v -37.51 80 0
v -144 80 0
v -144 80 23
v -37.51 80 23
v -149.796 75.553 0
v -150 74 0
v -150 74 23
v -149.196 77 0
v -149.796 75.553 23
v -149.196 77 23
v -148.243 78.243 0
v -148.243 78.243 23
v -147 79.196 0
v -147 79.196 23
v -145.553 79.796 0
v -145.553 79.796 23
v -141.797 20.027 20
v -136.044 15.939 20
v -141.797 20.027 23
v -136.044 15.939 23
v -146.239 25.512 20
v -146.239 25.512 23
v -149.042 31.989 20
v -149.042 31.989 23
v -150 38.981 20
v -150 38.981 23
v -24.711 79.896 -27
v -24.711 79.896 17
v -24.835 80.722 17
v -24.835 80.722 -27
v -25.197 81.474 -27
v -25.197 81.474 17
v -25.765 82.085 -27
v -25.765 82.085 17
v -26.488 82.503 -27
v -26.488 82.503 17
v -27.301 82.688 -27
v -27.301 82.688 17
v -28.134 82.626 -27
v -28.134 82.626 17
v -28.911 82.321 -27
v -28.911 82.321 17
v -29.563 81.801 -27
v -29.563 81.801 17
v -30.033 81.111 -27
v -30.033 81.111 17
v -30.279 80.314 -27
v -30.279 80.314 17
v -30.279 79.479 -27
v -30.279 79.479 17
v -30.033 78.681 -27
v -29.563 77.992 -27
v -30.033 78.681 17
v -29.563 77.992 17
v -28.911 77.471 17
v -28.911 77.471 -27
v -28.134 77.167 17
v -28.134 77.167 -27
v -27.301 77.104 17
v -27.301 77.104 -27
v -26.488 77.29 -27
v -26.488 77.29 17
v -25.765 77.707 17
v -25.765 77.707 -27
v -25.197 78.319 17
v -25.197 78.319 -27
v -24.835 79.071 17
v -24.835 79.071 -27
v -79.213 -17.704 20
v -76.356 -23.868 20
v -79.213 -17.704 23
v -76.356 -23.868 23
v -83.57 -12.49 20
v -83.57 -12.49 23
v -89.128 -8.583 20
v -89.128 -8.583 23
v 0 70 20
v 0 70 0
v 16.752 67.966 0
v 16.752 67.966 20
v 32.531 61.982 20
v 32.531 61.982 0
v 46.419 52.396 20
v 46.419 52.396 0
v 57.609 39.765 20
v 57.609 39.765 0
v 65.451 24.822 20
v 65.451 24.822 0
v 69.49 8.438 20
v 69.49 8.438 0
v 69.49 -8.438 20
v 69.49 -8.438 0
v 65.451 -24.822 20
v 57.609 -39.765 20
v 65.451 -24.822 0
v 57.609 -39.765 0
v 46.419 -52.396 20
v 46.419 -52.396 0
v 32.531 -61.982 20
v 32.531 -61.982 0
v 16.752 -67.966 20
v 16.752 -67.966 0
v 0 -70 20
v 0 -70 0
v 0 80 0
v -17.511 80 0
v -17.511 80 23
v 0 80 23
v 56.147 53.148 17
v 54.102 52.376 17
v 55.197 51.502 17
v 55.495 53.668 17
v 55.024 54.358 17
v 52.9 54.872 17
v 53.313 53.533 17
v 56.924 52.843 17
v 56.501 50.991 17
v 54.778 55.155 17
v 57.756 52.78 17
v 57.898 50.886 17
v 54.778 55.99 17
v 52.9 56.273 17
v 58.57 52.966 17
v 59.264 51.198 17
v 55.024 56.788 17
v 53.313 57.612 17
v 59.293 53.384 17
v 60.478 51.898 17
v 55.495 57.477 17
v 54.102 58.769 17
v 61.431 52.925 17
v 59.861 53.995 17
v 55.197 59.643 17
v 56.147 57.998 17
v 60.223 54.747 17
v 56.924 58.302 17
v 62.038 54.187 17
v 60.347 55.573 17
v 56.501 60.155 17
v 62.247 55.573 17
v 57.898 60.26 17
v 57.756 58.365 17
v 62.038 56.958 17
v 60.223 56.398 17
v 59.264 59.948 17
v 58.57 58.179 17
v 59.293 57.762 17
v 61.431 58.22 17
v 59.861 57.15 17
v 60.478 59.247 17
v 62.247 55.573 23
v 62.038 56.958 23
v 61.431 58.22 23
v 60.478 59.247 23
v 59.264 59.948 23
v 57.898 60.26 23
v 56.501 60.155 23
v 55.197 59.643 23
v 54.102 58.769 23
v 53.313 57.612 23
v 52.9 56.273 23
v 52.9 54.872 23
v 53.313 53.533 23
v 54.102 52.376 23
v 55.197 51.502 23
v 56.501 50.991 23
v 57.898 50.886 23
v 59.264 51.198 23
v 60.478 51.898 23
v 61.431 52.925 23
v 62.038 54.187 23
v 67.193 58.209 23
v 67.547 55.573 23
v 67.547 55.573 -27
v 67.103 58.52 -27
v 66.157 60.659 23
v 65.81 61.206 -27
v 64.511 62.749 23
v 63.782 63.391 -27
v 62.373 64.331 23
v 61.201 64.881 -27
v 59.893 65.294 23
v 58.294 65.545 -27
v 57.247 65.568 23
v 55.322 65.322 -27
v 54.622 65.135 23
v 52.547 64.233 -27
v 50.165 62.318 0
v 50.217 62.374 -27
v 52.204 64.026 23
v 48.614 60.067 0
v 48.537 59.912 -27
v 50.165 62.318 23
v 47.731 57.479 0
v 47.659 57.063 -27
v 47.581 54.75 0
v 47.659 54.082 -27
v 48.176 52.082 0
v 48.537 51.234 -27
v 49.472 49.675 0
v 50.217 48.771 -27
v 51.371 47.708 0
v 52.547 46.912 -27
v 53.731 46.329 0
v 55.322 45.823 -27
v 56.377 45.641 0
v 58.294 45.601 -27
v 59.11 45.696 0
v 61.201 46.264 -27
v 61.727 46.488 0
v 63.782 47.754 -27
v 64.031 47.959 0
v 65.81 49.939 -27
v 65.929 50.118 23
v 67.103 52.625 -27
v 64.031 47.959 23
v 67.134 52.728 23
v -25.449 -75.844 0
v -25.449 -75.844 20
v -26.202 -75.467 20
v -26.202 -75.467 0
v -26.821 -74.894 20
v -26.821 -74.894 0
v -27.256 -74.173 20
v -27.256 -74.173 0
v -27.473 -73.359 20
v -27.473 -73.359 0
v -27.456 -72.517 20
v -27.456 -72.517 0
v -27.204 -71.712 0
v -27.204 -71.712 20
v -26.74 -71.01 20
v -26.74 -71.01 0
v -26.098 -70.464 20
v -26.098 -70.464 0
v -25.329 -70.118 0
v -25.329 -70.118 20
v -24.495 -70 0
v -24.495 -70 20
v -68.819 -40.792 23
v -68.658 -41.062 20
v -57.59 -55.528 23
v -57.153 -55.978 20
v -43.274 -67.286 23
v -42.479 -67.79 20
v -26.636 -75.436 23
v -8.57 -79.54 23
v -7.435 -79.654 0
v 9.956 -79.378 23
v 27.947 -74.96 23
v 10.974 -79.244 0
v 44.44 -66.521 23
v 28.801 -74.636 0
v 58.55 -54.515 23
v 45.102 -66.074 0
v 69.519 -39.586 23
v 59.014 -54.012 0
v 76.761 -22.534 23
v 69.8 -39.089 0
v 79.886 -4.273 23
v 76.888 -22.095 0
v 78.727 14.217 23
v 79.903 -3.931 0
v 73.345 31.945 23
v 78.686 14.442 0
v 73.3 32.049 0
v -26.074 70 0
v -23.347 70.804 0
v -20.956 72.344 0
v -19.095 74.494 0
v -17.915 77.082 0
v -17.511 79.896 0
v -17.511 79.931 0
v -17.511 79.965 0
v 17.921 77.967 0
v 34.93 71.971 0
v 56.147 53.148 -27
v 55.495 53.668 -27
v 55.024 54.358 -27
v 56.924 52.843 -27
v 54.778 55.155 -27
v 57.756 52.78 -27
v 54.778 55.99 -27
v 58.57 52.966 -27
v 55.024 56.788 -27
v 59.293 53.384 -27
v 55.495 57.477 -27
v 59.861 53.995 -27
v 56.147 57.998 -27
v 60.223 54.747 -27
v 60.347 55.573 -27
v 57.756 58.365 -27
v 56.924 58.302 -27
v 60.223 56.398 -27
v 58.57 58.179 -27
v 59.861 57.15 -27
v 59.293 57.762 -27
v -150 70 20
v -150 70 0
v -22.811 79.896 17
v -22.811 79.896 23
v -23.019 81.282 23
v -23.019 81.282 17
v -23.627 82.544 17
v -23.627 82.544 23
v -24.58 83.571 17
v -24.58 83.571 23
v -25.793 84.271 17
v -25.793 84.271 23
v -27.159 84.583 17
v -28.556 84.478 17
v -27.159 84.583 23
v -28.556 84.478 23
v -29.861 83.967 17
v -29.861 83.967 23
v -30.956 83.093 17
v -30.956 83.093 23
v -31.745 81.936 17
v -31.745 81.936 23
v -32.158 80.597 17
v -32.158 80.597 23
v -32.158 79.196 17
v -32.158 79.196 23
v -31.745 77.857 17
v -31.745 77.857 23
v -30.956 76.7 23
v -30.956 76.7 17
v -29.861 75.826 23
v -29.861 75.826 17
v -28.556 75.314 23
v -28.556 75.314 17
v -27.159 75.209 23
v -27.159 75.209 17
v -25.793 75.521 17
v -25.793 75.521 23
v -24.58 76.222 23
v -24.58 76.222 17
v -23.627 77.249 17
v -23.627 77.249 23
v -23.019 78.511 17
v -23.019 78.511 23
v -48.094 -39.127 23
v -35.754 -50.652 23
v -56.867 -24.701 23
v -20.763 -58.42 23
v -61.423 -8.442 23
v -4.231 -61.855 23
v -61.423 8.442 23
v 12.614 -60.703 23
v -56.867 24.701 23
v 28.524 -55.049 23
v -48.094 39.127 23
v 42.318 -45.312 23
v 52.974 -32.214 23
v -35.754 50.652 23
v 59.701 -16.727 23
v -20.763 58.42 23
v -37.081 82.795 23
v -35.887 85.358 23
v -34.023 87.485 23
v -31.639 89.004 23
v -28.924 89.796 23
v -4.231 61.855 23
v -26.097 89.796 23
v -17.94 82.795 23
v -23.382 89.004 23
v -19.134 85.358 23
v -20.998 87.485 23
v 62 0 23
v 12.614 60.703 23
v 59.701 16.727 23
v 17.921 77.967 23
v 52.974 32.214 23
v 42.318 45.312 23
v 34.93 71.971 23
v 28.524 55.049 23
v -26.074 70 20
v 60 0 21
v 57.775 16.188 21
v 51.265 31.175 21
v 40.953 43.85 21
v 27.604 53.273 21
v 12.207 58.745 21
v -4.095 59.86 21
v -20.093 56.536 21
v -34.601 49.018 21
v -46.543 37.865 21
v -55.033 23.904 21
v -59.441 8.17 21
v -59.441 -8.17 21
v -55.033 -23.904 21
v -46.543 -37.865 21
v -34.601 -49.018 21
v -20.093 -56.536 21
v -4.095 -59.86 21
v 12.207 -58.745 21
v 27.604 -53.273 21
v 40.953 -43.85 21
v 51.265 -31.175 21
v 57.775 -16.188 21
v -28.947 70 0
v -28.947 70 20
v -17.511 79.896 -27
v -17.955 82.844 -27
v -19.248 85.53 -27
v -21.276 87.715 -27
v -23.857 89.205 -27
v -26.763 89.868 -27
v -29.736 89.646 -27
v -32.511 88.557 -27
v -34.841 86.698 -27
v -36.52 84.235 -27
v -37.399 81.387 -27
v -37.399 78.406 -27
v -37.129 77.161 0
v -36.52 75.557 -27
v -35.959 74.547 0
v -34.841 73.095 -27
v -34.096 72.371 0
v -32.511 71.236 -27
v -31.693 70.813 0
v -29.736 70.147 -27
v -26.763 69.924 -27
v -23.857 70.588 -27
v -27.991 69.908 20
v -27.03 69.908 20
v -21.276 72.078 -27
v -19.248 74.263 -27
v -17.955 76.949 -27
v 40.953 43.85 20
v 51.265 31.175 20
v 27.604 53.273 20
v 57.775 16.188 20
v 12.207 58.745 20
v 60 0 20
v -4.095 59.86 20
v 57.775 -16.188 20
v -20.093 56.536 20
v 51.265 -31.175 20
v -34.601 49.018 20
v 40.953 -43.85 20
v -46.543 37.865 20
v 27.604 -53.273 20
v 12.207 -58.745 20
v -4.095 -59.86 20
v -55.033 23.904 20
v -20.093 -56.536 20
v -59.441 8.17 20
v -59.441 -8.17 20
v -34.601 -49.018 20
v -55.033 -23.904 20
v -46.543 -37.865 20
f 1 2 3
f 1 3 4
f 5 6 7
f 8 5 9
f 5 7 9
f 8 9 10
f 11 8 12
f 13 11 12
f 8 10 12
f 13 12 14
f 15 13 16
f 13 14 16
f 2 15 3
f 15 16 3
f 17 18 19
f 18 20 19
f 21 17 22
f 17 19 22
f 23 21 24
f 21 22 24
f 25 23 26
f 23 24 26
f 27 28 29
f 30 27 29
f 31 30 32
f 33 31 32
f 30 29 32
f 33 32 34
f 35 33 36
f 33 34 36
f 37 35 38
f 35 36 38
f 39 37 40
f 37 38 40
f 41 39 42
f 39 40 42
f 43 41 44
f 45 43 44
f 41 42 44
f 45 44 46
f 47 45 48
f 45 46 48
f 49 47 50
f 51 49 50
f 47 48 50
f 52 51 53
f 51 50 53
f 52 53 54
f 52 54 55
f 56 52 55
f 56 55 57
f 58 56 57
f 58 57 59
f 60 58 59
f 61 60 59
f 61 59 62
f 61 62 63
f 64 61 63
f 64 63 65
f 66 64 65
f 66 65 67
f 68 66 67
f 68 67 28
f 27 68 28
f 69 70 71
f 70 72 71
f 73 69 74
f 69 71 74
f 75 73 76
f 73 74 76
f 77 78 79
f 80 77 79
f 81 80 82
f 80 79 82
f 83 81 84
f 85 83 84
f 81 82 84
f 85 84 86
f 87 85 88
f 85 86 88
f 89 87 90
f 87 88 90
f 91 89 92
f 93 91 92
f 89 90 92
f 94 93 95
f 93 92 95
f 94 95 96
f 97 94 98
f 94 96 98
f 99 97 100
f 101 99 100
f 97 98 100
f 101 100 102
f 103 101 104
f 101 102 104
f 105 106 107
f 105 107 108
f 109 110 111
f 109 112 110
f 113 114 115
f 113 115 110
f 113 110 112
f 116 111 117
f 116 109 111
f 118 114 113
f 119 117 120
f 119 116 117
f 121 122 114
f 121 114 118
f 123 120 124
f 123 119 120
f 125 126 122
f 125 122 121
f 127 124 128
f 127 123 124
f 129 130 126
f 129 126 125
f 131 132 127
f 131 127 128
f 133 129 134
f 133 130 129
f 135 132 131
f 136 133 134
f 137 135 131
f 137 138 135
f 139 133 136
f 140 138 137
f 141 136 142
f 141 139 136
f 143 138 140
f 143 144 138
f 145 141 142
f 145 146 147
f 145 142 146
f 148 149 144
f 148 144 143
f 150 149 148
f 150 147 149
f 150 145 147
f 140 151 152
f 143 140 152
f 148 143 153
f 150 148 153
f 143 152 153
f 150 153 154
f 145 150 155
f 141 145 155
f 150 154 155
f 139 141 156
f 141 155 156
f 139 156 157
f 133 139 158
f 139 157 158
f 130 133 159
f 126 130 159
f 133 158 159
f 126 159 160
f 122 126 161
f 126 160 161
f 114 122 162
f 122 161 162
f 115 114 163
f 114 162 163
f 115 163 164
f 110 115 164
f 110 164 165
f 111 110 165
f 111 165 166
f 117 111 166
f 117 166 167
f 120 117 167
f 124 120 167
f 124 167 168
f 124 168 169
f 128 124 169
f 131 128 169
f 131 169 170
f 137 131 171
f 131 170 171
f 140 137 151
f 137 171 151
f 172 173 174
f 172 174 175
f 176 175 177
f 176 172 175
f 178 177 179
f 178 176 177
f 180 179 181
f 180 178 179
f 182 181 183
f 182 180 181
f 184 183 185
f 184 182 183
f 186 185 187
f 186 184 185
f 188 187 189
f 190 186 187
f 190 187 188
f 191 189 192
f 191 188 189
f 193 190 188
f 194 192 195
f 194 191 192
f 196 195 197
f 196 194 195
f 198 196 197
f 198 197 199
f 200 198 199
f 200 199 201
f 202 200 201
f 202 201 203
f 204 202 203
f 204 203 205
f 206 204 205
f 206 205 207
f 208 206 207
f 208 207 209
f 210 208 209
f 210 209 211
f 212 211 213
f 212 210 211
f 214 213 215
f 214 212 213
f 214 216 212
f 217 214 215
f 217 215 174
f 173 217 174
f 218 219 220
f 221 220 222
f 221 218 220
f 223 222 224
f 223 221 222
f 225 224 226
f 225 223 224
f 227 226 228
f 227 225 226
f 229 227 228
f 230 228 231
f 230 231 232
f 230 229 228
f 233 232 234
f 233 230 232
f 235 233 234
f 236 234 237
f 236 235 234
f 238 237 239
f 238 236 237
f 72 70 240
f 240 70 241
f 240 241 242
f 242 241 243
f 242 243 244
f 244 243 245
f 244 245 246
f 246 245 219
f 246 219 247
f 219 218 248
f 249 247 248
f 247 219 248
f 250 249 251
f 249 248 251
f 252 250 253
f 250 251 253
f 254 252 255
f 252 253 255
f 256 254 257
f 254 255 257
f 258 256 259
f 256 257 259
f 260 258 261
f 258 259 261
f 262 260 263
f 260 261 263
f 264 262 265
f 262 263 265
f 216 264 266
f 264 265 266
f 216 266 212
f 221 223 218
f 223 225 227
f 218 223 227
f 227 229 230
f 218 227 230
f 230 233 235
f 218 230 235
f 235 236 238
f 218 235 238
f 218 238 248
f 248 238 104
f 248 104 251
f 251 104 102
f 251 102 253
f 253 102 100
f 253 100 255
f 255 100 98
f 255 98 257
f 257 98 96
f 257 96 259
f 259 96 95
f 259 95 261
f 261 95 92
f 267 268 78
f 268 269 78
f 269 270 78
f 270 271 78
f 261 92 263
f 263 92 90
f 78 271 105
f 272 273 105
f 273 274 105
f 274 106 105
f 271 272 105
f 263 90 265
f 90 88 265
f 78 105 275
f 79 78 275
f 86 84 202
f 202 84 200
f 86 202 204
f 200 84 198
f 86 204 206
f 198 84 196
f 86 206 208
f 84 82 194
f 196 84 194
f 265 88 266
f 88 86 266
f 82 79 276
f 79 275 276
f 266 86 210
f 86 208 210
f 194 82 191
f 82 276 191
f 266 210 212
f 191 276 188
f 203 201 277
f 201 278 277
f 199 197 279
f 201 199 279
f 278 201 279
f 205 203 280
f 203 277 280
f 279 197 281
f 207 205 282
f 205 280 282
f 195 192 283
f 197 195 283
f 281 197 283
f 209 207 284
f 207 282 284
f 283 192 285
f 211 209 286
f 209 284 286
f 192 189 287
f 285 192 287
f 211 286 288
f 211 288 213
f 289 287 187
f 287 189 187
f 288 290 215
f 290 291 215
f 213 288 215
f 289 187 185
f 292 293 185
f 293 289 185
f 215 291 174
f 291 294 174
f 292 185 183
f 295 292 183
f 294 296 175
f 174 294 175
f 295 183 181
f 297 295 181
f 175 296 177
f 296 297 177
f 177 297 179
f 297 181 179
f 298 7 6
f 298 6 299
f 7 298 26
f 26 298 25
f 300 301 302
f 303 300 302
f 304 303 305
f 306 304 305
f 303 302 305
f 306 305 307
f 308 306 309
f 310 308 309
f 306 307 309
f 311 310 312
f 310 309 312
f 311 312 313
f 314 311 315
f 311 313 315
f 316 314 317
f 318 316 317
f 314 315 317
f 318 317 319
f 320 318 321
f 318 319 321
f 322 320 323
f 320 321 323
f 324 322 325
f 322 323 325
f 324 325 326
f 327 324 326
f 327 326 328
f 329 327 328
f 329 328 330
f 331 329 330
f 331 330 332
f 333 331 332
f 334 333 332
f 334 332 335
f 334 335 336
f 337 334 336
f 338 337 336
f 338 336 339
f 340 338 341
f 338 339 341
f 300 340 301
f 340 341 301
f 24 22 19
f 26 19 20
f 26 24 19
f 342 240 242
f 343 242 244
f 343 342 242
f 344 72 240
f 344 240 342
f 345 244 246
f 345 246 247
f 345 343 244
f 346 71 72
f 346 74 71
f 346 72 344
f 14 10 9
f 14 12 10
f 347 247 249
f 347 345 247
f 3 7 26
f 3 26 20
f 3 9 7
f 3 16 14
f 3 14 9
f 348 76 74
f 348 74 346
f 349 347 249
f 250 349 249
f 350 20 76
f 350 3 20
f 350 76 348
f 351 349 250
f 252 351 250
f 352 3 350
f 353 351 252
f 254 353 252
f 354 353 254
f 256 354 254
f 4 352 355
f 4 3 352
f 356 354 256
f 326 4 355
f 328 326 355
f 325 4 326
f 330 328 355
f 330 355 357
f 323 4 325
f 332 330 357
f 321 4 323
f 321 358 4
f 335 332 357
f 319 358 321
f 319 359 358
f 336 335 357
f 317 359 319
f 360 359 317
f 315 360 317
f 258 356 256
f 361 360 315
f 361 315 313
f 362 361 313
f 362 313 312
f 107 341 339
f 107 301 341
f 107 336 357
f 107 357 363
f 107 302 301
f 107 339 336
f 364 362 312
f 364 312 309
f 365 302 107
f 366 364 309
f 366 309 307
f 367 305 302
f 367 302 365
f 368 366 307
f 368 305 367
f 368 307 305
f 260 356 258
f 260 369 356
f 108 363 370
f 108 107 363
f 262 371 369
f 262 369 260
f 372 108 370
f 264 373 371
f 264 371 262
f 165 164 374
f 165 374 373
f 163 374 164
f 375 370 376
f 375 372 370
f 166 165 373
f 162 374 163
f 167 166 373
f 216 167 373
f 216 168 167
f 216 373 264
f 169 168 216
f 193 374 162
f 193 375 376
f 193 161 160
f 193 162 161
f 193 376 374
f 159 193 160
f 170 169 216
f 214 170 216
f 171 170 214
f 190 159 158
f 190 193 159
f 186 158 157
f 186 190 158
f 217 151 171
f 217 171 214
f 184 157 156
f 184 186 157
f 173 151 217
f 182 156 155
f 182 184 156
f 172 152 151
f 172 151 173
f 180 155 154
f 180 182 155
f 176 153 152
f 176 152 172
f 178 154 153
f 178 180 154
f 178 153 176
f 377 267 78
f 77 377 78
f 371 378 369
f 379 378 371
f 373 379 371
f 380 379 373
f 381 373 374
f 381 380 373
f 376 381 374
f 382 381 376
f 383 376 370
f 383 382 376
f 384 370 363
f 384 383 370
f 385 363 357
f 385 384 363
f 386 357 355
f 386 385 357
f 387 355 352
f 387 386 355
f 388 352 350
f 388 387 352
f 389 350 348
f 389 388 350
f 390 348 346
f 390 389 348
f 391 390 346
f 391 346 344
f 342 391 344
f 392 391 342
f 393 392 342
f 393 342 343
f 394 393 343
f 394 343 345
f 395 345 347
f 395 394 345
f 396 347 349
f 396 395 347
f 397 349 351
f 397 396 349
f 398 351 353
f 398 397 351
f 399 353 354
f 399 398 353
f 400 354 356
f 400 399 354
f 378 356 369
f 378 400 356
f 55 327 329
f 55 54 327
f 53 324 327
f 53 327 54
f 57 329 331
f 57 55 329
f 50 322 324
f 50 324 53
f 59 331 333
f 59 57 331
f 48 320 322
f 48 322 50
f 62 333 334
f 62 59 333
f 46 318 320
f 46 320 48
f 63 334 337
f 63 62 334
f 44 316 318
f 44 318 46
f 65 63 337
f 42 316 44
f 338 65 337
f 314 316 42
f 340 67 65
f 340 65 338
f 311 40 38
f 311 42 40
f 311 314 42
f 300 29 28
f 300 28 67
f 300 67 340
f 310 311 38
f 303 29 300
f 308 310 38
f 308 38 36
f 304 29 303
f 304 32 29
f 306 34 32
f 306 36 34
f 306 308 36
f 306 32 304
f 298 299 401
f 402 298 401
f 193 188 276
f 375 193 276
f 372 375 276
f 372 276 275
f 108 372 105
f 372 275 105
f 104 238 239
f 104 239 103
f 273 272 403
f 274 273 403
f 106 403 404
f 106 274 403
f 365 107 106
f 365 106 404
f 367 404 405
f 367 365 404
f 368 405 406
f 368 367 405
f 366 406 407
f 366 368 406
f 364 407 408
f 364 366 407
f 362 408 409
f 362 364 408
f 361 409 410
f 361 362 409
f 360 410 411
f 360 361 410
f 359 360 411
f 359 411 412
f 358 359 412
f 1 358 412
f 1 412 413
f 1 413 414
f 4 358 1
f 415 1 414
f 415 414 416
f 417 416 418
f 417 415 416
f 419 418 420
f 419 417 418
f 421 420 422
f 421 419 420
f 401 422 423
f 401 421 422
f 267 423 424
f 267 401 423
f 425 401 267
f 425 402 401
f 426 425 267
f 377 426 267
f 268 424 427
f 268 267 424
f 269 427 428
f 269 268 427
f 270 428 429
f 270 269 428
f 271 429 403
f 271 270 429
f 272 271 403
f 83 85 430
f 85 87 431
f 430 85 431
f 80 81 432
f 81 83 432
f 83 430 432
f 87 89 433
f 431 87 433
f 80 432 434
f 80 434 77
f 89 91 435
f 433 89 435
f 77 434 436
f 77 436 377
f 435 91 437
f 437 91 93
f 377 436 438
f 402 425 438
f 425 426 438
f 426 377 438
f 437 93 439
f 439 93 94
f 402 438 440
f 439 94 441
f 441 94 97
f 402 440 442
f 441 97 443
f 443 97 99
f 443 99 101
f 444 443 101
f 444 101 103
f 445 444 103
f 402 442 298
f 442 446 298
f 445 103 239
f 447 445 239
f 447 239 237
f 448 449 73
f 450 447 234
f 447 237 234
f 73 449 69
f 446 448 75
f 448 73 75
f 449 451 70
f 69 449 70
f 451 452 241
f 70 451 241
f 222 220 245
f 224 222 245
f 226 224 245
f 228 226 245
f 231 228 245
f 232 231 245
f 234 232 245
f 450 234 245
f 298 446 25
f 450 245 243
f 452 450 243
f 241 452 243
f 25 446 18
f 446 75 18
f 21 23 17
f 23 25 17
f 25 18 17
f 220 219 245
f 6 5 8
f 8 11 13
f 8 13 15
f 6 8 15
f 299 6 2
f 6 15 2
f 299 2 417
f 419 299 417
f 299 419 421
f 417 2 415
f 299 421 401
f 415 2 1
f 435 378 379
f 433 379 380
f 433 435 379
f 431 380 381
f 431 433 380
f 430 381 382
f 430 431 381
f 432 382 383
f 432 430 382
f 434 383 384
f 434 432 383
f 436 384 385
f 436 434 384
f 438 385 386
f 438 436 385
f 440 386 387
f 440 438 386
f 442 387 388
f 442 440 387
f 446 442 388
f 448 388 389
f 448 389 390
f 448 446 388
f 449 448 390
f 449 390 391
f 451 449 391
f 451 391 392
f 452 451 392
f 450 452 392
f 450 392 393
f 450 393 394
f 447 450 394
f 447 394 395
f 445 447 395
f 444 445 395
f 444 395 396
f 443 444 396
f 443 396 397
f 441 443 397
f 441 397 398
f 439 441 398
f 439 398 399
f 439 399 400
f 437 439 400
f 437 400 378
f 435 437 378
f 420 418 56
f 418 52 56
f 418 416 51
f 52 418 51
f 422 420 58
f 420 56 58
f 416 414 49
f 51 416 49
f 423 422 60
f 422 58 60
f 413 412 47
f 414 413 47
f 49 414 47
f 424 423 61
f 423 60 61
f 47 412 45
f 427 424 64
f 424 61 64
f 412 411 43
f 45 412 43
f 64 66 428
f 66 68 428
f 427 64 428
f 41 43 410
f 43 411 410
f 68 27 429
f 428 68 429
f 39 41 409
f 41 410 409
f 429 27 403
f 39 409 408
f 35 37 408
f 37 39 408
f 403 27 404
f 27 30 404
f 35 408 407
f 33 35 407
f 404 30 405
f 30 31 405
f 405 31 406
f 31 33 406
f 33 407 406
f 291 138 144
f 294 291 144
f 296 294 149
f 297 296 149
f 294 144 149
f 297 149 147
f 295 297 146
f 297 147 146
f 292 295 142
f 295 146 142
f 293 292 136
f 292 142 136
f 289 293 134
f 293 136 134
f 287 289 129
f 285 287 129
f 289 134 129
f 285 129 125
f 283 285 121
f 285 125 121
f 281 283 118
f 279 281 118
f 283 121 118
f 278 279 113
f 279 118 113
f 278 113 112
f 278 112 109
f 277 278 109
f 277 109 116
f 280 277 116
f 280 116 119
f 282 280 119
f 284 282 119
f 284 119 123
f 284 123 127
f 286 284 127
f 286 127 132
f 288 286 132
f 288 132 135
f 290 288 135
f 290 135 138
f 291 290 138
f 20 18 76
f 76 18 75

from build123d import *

# Parameters (mm, degrees)
SKETCH_R        = 60
PAD_DEPTH       = 23
POCKET_DEPTH    = 20
SKETCH002_R     = 10
PAD001_DEPTH    = 50
SKETCH005_R     = 2.8
POCKET001_DEPTH = 50.001
SKETCH006_R     = 4.7
POCKET002_DEPTH = 6
FILLET_R        = 26
CHAMFER_SIZE    = 2
FILLET001_R     = 6
FILLET002_R     = 3


with BuildPart() as part:
    # Sketch → Pad (new body)
    with BuildSketch(Plane.XY):
        with BuildLine():
            ThreePointArc((-78.765475, -14), (61.318839, -51.38093), (0, 80))
            Line((-150, 80), (0, 80))
            Line((-150, 80), (-150, 23.233627))
            Line((-150, 23.233627), (-78.765475, -14))
        make_face()
        Circle(SKETCH_R, mode=Mode.SUBTRACT)
    extrude(amount=PAD_DEPTH)

    # Sketch001 (on Face6 of Pad) → Pocket (cut)
    with BuildSketch(Plane(origin=(0, 0, 0), x_dir=(1, 0, 0), z_dir=(0, 0, -1))):
        with BuildLine():
            Line((-178.35, 70), (0, 70))
            ThreePointArc((0, -70), (70, 0), (0, 70))
            Line((-178.35, -70), (0, -70))
            Line((-178.35, 70), (-178.35, -70))
        make_face()
    extrude(amount=-POCKET_DEPTH, mode=Mode.SUBTRACT)

    # Sketch002 (on Face6 of Pocket) → Pad001 (join)
    with BuildSketch(Plane.XY.offset(23)):
        with Locations((57.547184, 55.57267)):
            Circle(SKETCH002_R)
        with Locations((-27.510509, 79.89632)):
            Circle(SKETCH002_R)
    extrude(amount=-PAD001_DEPTH)

    # Sketch005 (on Face5 of Pad001) → Pocket001 (cut, through all)
    with BuildSketch(Plane.XY.offset(23)):
        with Locations((-27.510509, 79.89632)):
            Circle(SKETCH005_R)
        with Locations((57.547184, 55.57267)):
            Circle(SKETCH005_R)
    extrude(amount=-POCKET001_DEPTH, mode=Mode.SUBTRACT)

    # Sketch006 (on Face15 of Pocket001) → Pocket002 (cut)
    with BuildSketch(Plane.XY.offset(23)):
        with Locations((-27.510509, 79.89632)):
            Circle(SKETCH006_R)
        with Locations((57.547184, 55.57267)):
            Circle(SKETCH006_R)
    extrude(amount=-POCKET002_DEPTH, mode=Mode.SUBTRACT)

    # Fillet
    fillet_edges = [part.edges().sort_by_distance(p)[0] for p in [
        (-150, 23.233627, 21.5),
        (-78.765475, -14, 21.5),
    ]]
    fillet(fillet_edges, radius=FILLET_R)

    # Chamfer
    chamfer_edges = [part.edges().sort_by_distance(p)[0] for p in [
        (-60, 0, 23),
    ]]
    chamfer(chamfer_edges, length=CHAMFER_SIZE)

    # Fillet001
    fillet001_edges = [part.edges().sort_by_distance(p)[0] for p in [
        (-150, 80, 11.5),
    ]]
    fillet(fillet001_edges, radius=FILLET001_R)

    # Fillet002
    fillet002_edges = [part.edges().sort_by_distance(p)[0] for p in [
        (-38.729833, -70, 10),
    ]]
    fillet(fillet002_edges, radius=FILLET002_R)


solid = part.part
